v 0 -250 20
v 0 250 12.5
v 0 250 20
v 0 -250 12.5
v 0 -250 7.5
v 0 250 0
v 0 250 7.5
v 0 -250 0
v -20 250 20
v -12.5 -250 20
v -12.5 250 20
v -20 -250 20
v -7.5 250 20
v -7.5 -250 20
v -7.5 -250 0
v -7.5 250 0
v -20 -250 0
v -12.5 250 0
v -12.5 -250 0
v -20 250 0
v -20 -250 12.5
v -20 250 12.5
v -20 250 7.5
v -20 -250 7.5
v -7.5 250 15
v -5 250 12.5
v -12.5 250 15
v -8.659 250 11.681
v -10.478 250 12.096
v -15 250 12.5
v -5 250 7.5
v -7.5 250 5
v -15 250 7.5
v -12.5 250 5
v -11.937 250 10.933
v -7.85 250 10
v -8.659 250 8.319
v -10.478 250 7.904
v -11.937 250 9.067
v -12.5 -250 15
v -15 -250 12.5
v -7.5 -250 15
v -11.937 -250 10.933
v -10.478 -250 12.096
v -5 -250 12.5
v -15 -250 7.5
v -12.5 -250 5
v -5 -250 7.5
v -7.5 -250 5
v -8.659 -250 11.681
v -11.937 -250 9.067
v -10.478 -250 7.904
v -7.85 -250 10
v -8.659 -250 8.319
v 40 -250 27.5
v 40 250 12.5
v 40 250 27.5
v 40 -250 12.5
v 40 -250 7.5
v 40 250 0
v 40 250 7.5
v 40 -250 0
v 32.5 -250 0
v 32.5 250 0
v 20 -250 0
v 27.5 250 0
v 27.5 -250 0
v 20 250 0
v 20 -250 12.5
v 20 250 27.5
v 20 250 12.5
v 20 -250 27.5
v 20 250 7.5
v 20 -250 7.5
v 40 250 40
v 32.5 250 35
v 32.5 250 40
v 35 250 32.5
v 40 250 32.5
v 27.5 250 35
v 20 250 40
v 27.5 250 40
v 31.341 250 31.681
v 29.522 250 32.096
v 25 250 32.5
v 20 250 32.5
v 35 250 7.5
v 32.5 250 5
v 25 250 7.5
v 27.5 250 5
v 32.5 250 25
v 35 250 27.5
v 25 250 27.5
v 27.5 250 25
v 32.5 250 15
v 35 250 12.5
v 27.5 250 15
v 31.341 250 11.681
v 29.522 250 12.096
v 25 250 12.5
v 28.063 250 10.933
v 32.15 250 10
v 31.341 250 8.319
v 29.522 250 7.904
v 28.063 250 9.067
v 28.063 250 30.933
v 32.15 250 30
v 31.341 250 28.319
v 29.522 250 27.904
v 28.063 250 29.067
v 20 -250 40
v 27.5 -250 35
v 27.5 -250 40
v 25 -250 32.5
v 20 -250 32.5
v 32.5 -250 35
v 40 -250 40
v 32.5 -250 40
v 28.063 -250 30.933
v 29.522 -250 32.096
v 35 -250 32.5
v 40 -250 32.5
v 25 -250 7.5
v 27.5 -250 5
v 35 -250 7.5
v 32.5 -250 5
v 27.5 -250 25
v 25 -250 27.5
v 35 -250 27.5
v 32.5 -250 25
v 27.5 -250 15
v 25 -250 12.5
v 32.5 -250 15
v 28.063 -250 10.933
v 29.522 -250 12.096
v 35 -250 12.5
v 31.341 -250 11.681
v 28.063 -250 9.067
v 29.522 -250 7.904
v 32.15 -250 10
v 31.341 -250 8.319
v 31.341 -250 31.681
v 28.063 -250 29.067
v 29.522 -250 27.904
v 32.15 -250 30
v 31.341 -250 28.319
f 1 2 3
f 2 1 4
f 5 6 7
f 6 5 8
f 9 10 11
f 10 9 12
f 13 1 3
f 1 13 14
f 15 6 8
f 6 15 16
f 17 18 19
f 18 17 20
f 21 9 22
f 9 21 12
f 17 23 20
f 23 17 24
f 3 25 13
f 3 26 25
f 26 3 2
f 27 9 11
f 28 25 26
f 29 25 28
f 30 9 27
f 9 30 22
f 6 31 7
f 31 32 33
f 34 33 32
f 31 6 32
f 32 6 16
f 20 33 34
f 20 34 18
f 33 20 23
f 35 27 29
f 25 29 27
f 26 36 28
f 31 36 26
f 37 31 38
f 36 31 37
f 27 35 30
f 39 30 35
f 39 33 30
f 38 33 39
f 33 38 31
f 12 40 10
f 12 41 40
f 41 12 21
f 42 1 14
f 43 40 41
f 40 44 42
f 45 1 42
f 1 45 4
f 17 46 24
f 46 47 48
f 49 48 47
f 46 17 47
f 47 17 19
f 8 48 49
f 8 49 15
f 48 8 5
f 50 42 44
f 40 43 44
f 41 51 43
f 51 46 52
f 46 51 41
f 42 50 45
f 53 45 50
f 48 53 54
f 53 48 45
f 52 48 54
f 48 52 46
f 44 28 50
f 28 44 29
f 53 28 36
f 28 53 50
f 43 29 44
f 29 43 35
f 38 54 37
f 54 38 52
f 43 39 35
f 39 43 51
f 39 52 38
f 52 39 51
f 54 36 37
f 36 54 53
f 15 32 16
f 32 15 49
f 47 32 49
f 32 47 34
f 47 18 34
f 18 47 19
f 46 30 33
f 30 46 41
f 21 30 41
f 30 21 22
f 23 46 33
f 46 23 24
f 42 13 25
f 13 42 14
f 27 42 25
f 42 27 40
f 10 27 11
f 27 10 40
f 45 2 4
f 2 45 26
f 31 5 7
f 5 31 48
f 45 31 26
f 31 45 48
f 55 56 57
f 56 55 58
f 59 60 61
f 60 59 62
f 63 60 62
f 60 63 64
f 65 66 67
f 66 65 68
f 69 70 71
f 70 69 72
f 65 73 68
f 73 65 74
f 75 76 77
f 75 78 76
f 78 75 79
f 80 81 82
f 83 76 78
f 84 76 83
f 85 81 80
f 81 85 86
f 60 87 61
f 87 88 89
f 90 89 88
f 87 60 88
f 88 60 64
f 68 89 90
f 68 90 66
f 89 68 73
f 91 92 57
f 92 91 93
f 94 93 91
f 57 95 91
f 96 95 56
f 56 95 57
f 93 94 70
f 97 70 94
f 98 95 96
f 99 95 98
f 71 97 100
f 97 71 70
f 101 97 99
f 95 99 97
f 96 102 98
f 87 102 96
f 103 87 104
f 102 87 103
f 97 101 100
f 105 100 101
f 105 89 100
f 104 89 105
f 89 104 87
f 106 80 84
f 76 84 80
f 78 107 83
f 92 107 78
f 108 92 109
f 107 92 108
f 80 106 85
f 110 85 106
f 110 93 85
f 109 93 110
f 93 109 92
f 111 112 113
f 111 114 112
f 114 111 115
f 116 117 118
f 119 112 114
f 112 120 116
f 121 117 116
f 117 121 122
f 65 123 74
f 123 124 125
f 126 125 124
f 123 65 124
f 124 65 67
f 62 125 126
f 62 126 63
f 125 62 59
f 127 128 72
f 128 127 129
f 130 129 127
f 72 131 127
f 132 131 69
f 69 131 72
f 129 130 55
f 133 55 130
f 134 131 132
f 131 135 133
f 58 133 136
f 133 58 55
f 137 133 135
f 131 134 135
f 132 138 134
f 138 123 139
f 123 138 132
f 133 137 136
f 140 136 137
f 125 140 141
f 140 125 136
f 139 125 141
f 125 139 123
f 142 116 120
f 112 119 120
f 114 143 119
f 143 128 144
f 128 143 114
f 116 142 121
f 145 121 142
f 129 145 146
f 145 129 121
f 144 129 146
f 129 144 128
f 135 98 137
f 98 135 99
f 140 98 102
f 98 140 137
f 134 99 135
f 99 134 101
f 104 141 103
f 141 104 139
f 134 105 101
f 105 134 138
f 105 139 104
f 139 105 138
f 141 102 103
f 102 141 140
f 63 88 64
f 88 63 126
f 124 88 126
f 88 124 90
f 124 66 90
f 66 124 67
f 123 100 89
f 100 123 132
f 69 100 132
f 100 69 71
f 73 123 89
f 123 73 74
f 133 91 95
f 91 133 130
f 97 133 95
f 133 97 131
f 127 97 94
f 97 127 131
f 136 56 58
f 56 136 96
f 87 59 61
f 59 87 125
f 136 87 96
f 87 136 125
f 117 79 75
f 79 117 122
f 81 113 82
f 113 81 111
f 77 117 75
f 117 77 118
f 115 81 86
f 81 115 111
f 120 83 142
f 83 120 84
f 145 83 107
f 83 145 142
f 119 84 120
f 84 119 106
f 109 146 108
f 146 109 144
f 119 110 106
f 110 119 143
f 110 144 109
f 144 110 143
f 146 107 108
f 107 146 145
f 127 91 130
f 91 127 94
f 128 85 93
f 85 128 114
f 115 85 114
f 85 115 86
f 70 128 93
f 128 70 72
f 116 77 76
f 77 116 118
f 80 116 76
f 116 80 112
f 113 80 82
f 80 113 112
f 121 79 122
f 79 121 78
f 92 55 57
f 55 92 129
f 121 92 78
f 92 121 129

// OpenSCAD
module beam_2020(length=500) {
	color("grey") translate([0, -length/2, 0]) {
		render() difference() {
			cube([20, length, 20]);
			
			translate([10, length, 10]) rotate([90, 0, 0]) cylinder(d=4.3, h=length);
			
			offset = (20-5)/2;
			translate([offset, 0, 0]) cube([5, length, 5]);
			translate([0, 0, offset]) cube([5, length, 5]);
			translate([offset, 0, offset*2]) cube([5, length, 5]);
			translate([offset*2, 0, offset]) cube([5, length, 5]);
		}
	}
}

module beam_2040(length=500) {
	beam_2020(length);
	translate([0, 0, 20]) beam_2020(length);
}

module beam_2020z(length=500) {
	translate([0, 20, length/2]) rotate([90, 0, 0]) beam_2020(length);
}

translate([-20, 0, 0]) beam_2020(500);
translate([20, 0, 0]) beam_2040(500);
